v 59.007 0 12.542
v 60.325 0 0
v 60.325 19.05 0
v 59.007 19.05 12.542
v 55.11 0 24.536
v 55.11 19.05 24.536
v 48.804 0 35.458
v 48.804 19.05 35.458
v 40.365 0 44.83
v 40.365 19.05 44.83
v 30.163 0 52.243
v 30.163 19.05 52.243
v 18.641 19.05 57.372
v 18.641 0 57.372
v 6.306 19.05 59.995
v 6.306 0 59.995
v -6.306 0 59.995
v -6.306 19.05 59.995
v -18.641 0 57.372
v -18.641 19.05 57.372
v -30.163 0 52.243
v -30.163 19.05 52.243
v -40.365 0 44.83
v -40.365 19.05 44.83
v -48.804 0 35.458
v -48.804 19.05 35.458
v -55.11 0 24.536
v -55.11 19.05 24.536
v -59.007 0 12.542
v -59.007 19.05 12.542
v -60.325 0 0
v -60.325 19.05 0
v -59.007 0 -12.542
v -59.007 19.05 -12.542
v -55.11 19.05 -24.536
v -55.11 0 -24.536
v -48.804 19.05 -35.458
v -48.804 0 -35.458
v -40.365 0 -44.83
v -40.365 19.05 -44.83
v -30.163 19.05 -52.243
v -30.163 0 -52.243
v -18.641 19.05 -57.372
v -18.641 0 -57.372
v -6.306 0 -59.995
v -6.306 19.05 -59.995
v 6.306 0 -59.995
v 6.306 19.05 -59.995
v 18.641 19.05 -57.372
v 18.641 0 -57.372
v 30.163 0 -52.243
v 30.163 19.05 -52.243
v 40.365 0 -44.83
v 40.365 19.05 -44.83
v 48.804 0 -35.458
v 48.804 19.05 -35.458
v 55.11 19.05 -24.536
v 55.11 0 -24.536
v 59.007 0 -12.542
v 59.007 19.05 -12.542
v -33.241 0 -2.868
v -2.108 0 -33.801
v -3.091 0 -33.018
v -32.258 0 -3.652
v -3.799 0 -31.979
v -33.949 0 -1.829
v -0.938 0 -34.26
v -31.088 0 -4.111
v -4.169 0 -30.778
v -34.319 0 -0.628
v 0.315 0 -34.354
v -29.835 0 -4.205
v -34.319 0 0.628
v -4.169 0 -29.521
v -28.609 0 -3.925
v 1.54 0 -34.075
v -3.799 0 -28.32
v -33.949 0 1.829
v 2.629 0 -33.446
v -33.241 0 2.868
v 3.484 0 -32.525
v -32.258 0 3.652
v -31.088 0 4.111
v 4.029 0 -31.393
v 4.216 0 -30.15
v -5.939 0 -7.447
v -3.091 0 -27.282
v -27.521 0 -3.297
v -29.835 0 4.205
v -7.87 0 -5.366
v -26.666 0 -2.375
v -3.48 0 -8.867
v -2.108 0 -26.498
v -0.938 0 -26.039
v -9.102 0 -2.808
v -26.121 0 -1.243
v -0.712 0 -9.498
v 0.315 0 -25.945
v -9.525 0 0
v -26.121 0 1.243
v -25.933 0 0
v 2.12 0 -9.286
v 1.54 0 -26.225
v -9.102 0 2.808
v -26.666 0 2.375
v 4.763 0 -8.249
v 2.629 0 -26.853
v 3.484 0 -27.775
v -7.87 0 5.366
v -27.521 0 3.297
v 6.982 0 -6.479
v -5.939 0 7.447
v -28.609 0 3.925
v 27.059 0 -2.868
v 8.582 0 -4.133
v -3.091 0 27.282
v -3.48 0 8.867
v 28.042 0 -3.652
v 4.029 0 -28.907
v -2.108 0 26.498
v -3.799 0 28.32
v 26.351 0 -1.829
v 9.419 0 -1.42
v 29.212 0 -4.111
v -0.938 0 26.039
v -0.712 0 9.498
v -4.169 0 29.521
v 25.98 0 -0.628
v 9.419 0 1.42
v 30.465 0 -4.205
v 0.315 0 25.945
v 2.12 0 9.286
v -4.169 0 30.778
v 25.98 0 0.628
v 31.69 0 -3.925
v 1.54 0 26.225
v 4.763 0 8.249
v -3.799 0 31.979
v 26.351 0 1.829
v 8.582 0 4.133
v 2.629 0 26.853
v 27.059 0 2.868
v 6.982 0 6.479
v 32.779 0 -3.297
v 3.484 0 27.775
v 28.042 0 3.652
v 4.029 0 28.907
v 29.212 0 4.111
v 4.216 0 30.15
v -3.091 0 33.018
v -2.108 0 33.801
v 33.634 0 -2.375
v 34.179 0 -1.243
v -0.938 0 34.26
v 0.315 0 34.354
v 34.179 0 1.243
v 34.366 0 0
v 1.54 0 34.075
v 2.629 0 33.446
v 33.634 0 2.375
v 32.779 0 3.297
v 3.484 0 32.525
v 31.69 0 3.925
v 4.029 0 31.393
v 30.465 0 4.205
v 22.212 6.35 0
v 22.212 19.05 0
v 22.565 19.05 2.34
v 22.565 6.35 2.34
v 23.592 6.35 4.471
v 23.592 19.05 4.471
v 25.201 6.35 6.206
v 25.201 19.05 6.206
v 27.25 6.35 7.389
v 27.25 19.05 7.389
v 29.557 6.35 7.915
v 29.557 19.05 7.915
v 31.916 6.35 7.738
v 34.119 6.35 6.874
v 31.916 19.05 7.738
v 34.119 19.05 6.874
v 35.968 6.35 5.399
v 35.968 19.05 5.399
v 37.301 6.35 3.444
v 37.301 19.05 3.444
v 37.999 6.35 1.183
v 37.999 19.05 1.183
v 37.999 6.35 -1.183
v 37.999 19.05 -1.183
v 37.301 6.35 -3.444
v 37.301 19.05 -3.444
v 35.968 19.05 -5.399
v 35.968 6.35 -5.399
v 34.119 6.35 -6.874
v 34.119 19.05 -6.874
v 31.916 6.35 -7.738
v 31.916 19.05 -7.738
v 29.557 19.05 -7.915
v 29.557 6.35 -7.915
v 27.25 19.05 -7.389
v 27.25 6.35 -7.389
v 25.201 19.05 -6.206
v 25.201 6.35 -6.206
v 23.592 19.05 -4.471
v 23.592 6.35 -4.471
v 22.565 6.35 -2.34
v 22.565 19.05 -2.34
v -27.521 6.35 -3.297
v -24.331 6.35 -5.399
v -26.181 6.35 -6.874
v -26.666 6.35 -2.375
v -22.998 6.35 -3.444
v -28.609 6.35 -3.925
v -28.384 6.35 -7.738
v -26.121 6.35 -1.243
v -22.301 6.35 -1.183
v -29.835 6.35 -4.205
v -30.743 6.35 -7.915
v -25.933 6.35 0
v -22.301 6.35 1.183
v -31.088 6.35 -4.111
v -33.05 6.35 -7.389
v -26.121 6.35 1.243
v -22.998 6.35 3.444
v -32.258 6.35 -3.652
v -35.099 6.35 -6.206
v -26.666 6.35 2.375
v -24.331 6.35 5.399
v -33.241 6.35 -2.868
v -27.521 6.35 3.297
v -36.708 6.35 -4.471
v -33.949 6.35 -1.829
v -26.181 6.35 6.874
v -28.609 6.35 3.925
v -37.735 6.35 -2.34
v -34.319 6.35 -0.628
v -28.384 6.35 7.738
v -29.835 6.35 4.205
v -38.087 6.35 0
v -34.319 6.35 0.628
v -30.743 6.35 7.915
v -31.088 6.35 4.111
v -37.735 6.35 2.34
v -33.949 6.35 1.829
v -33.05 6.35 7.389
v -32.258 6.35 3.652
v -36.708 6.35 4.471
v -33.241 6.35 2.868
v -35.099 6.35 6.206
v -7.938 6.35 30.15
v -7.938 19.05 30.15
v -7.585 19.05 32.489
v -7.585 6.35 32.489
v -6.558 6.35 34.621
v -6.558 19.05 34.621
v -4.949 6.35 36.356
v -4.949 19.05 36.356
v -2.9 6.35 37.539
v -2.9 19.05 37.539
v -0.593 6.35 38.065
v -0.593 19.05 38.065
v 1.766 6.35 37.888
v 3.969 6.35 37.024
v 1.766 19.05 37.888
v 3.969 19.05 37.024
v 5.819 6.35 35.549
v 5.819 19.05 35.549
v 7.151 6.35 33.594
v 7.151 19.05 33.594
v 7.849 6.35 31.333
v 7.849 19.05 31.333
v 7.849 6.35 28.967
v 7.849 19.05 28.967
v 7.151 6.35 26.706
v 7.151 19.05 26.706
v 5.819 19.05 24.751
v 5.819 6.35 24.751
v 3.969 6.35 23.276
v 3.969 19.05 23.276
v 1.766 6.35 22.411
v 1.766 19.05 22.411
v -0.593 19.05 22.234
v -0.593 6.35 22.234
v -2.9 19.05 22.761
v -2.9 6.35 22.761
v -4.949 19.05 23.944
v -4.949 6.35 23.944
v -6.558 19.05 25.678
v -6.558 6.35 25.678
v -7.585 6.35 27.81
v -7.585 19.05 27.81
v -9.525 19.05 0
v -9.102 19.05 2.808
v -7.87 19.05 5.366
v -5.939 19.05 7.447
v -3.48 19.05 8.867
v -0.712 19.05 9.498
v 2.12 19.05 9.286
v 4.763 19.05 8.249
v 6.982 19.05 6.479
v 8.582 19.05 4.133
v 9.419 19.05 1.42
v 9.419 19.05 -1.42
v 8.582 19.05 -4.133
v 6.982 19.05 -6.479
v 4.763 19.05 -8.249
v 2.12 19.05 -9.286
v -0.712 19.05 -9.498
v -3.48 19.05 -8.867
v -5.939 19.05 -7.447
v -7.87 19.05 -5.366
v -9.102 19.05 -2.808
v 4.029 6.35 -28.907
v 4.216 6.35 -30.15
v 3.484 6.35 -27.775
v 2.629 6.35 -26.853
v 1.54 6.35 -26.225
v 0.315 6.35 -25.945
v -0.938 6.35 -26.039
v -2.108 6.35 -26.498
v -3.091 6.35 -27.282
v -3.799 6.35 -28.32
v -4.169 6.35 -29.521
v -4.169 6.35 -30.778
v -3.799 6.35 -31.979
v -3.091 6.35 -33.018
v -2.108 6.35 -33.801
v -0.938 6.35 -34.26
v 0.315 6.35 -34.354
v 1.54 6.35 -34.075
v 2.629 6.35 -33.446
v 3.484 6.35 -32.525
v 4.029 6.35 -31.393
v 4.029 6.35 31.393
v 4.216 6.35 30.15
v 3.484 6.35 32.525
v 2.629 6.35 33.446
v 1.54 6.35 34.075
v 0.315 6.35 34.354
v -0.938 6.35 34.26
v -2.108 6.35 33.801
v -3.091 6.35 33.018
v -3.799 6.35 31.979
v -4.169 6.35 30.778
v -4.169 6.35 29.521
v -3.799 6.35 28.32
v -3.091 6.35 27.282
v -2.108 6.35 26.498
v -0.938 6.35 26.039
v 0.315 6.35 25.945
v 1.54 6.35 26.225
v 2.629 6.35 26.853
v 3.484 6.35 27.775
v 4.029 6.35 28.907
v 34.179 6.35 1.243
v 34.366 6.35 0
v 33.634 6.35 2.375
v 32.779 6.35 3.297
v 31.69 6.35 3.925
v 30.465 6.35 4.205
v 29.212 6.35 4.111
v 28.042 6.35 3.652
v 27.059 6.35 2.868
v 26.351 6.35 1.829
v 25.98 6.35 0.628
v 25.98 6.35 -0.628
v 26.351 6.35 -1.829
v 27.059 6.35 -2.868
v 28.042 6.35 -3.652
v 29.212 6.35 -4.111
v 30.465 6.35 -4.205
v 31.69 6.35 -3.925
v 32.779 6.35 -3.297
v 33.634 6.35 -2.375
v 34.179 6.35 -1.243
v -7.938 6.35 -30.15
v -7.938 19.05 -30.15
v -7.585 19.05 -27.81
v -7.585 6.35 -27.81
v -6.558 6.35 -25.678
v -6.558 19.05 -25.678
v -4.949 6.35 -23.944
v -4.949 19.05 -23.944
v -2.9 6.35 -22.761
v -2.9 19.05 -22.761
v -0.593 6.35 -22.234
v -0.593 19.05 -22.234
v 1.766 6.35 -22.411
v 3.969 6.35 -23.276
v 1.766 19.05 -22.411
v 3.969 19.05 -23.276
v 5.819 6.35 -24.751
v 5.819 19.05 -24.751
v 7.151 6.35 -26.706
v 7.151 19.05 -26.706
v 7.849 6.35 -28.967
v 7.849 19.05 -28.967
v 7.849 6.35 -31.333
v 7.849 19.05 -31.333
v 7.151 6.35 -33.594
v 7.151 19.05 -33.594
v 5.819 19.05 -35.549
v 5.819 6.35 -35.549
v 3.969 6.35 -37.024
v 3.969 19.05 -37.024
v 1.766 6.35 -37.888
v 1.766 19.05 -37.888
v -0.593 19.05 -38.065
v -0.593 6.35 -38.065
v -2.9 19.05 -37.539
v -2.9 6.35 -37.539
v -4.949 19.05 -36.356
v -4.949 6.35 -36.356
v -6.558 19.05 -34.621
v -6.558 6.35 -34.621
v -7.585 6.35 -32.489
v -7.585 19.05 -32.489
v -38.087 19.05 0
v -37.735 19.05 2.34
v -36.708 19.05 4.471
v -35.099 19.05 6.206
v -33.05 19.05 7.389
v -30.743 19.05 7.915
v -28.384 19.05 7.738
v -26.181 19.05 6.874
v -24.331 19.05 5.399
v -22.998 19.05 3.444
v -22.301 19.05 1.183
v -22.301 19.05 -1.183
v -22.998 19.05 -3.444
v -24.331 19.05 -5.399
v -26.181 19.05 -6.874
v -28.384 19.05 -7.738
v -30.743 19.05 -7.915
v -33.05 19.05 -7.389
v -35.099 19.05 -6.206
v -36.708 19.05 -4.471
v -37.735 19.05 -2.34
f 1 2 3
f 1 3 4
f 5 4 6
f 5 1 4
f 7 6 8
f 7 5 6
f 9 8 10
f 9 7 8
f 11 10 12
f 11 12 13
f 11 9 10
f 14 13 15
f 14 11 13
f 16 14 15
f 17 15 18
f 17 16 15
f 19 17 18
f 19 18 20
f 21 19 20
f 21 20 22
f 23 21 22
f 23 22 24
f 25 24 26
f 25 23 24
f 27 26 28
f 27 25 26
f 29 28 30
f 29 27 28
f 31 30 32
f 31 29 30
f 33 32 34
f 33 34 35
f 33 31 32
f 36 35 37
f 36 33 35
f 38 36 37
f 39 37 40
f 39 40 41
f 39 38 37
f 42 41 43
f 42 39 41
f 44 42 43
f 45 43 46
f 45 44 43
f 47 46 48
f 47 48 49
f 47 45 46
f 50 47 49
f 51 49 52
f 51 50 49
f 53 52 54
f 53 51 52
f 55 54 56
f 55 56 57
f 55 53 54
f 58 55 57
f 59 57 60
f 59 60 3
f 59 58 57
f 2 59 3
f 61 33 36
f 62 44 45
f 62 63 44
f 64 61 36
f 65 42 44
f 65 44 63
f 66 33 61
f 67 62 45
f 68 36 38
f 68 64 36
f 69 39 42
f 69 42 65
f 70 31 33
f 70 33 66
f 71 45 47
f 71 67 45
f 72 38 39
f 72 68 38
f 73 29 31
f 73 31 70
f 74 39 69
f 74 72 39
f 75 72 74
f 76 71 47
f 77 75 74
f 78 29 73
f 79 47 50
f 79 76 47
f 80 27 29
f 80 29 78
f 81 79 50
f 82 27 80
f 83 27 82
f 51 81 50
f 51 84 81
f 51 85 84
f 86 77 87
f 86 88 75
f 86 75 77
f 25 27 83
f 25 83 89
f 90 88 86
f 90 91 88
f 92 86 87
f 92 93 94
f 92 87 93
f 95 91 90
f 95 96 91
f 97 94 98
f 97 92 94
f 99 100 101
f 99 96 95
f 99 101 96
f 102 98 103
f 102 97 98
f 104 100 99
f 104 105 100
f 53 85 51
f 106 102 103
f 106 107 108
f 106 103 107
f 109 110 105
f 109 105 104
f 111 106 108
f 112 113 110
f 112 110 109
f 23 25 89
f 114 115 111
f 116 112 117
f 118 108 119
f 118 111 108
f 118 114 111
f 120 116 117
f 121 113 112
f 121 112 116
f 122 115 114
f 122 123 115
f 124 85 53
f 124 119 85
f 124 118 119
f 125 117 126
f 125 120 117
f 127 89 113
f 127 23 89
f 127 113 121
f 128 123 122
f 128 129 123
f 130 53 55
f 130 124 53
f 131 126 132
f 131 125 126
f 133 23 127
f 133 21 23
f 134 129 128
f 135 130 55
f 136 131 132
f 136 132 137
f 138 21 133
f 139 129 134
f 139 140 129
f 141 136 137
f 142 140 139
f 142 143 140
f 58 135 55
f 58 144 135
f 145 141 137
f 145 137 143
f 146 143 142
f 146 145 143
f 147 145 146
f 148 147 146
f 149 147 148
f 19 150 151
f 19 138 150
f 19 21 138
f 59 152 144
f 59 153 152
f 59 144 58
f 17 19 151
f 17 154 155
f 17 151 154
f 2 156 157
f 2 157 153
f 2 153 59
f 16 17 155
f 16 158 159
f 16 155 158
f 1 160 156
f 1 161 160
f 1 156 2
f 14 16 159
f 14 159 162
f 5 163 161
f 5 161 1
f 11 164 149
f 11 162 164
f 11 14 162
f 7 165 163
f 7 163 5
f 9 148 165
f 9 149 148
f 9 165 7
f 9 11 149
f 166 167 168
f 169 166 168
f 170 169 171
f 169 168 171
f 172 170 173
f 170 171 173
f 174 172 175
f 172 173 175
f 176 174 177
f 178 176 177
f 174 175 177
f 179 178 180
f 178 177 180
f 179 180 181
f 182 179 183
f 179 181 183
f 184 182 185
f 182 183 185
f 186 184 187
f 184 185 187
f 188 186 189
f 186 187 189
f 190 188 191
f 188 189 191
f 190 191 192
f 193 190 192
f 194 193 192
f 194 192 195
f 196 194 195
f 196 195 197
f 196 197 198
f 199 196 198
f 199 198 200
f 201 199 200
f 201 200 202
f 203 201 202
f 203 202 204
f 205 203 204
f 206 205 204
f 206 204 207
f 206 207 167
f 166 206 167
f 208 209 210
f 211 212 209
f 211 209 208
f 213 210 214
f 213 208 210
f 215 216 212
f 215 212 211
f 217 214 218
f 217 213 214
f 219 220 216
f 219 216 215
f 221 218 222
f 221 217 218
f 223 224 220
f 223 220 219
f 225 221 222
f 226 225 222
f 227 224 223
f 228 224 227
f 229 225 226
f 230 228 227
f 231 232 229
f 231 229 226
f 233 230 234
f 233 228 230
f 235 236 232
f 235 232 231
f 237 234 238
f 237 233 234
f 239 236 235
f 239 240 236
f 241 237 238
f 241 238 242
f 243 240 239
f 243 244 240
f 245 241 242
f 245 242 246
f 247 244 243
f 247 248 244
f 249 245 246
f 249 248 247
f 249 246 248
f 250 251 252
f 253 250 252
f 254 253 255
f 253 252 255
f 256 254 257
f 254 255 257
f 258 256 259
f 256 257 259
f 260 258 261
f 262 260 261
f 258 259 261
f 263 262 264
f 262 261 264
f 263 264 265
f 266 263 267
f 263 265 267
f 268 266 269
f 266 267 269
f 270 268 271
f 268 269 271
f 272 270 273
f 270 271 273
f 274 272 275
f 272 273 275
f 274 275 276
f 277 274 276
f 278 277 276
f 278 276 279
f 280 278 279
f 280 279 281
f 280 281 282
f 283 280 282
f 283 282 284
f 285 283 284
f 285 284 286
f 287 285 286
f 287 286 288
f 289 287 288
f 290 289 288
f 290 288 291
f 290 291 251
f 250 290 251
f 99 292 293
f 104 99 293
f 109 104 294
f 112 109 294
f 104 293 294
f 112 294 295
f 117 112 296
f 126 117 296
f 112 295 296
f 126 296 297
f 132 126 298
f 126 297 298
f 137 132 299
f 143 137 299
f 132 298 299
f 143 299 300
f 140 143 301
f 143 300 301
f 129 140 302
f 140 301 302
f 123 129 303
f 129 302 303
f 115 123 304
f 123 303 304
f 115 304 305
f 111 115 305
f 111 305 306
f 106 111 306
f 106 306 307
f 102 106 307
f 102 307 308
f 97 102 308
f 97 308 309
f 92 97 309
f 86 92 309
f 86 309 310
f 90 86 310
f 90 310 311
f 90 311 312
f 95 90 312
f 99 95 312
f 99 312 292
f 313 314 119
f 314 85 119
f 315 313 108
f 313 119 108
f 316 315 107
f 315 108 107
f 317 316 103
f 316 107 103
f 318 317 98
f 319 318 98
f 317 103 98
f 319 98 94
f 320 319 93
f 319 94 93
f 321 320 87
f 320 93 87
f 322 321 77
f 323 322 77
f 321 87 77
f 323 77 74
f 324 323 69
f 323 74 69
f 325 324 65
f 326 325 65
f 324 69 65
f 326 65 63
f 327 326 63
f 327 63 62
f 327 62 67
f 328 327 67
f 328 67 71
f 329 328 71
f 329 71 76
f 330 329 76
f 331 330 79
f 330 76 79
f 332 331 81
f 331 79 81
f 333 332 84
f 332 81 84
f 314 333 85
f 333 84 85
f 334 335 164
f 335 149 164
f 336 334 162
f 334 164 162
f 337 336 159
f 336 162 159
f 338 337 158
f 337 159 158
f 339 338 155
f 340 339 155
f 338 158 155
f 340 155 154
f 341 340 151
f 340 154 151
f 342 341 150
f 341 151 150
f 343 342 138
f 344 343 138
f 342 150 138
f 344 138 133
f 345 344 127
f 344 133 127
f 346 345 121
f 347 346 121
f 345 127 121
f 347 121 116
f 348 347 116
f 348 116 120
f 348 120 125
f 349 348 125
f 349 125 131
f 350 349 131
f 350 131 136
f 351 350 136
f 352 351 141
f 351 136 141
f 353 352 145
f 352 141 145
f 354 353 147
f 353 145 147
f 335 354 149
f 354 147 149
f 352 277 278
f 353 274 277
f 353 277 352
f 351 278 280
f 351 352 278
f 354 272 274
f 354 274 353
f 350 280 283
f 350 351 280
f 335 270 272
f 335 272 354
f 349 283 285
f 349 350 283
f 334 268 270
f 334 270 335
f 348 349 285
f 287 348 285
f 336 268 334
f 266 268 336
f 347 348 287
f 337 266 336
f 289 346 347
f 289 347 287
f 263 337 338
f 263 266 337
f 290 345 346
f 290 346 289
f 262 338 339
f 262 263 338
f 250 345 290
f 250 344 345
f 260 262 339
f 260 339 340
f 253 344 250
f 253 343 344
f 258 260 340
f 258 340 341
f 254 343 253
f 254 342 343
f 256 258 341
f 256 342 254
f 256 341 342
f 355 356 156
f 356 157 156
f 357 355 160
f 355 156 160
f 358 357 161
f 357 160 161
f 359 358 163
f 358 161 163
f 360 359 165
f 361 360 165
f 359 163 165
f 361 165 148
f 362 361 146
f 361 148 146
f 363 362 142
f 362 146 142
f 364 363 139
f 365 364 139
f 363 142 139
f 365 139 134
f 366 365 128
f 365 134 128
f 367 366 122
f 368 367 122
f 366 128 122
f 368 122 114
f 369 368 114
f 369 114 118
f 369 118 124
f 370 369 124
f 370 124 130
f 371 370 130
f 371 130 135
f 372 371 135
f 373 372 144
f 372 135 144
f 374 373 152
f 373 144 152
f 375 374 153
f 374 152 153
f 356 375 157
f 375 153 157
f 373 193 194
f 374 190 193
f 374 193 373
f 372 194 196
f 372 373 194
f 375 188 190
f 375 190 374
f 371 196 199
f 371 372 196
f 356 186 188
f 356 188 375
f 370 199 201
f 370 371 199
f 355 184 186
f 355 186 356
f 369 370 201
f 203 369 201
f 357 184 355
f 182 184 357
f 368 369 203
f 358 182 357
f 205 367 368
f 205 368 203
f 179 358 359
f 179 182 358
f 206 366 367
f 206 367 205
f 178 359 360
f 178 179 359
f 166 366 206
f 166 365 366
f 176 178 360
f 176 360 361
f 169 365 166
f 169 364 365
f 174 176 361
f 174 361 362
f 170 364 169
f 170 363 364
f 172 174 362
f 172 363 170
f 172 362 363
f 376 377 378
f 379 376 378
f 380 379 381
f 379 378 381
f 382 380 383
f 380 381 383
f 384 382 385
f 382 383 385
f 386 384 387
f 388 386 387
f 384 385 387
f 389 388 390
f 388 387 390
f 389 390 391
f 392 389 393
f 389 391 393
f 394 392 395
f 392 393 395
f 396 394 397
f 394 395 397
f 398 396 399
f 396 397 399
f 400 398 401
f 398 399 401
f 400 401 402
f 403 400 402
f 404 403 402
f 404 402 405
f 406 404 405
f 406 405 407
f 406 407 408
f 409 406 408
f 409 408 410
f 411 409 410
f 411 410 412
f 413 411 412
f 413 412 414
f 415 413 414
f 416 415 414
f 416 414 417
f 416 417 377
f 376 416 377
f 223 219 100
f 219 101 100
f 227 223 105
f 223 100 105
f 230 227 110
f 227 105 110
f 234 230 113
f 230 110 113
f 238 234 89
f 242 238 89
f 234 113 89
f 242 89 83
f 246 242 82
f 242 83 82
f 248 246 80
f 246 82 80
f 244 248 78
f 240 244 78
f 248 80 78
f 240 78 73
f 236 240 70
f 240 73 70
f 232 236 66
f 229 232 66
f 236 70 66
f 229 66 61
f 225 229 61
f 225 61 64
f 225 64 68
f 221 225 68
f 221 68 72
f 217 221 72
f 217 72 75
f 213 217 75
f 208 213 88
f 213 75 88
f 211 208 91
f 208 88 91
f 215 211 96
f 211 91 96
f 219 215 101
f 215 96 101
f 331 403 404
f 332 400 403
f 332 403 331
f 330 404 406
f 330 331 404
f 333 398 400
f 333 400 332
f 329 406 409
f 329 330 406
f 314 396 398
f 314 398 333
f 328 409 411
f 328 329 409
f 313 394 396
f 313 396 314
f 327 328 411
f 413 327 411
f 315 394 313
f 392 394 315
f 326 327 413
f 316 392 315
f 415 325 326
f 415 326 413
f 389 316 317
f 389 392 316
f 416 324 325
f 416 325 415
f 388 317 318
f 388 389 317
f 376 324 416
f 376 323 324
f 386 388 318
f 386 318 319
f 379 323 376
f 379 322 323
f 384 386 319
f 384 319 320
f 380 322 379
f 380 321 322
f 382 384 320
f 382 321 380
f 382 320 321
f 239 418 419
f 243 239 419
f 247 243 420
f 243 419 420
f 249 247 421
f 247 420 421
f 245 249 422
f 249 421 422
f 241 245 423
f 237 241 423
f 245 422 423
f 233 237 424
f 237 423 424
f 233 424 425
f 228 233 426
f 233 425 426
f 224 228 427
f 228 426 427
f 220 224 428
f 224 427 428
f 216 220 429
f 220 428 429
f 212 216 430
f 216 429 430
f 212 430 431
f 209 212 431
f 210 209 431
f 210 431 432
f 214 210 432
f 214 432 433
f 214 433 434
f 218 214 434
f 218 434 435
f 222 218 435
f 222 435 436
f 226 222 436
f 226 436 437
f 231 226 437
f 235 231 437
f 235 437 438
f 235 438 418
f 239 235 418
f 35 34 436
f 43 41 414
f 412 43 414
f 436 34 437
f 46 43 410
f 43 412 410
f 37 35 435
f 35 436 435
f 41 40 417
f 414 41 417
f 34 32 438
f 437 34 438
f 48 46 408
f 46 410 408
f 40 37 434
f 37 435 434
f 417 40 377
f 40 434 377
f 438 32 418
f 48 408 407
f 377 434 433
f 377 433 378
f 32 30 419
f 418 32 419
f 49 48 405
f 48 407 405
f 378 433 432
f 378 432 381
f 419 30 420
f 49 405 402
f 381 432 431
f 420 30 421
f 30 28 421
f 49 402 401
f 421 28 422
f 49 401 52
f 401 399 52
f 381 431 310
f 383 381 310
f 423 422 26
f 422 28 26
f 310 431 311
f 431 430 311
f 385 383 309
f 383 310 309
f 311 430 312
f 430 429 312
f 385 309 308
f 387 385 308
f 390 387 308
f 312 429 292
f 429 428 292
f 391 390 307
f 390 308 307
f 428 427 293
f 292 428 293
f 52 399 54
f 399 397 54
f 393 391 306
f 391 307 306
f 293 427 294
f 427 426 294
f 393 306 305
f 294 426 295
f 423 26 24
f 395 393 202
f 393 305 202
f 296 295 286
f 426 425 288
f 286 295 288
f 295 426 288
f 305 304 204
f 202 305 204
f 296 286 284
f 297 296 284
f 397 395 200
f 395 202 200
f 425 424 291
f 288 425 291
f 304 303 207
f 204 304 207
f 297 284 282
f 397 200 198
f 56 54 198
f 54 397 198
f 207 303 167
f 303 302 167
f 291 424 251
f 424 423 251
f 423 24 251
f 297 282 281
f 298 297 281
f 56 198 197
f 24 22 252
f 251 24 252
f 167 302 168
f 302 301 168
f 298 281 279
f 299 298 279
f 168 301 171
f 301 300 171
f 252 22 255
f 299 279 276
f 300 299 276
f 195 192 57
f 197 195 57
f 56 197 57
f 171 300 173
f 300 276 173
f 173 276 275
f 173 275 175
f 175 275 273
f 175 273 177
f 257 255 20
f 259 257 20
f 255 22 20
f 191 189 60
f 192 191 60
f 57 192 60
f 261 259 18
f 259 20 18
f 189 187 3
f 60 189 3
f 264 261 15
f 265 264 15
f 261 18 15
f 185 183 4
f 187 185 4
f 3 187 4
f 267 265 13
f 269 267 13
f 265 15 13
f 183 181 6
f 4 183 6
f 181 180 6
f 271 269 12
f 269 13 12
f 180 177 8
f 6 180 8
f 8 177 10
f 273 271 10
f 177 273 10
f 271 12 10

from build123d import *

# Parameters (mm, degrees)
F0_R           = 60.325
F1_DEPTH       = 19.05
F3_D           = 8.4328
F3_CBORE_D     = 15.875
F3_CBORE_DEPTH = 12.7
F4_R           = 9.525
F5_DEPTH       = 25.4


with BuildPart() as f1:
    # F0 (on Front) → F1 (new body)
    with BuildSketch(Plane.XZ):
        Circle(F0_R)
    extrude(amount=-F1_DEPTH)

    # F3 (through all)
    with Locations(Plane(origin=(0, 19.05, 0), x_dir=(-1, 0, 0), z_dir=(0, 1, 0))):
        with Locations((0, 30.1498), (30.1498, 0), (0, -30.1498), (-30.1498, 0)):
            CounterBoreHole(F3_D / 2, F3_CBORE_D / 2, F3_CBORE_DEPTH)

    # F4 (on face) → F5 (cut)
    with BuildSketch(Plane(origin=(0, 19.05, 0), x_dir=(-1, 0, 0), z_dir=(0, 1, 0))):
        Circle(F4_R)
    extrude(amount=-F5_DEPTH, mode=Mode.SUBTRACT)


solid = f1.part
